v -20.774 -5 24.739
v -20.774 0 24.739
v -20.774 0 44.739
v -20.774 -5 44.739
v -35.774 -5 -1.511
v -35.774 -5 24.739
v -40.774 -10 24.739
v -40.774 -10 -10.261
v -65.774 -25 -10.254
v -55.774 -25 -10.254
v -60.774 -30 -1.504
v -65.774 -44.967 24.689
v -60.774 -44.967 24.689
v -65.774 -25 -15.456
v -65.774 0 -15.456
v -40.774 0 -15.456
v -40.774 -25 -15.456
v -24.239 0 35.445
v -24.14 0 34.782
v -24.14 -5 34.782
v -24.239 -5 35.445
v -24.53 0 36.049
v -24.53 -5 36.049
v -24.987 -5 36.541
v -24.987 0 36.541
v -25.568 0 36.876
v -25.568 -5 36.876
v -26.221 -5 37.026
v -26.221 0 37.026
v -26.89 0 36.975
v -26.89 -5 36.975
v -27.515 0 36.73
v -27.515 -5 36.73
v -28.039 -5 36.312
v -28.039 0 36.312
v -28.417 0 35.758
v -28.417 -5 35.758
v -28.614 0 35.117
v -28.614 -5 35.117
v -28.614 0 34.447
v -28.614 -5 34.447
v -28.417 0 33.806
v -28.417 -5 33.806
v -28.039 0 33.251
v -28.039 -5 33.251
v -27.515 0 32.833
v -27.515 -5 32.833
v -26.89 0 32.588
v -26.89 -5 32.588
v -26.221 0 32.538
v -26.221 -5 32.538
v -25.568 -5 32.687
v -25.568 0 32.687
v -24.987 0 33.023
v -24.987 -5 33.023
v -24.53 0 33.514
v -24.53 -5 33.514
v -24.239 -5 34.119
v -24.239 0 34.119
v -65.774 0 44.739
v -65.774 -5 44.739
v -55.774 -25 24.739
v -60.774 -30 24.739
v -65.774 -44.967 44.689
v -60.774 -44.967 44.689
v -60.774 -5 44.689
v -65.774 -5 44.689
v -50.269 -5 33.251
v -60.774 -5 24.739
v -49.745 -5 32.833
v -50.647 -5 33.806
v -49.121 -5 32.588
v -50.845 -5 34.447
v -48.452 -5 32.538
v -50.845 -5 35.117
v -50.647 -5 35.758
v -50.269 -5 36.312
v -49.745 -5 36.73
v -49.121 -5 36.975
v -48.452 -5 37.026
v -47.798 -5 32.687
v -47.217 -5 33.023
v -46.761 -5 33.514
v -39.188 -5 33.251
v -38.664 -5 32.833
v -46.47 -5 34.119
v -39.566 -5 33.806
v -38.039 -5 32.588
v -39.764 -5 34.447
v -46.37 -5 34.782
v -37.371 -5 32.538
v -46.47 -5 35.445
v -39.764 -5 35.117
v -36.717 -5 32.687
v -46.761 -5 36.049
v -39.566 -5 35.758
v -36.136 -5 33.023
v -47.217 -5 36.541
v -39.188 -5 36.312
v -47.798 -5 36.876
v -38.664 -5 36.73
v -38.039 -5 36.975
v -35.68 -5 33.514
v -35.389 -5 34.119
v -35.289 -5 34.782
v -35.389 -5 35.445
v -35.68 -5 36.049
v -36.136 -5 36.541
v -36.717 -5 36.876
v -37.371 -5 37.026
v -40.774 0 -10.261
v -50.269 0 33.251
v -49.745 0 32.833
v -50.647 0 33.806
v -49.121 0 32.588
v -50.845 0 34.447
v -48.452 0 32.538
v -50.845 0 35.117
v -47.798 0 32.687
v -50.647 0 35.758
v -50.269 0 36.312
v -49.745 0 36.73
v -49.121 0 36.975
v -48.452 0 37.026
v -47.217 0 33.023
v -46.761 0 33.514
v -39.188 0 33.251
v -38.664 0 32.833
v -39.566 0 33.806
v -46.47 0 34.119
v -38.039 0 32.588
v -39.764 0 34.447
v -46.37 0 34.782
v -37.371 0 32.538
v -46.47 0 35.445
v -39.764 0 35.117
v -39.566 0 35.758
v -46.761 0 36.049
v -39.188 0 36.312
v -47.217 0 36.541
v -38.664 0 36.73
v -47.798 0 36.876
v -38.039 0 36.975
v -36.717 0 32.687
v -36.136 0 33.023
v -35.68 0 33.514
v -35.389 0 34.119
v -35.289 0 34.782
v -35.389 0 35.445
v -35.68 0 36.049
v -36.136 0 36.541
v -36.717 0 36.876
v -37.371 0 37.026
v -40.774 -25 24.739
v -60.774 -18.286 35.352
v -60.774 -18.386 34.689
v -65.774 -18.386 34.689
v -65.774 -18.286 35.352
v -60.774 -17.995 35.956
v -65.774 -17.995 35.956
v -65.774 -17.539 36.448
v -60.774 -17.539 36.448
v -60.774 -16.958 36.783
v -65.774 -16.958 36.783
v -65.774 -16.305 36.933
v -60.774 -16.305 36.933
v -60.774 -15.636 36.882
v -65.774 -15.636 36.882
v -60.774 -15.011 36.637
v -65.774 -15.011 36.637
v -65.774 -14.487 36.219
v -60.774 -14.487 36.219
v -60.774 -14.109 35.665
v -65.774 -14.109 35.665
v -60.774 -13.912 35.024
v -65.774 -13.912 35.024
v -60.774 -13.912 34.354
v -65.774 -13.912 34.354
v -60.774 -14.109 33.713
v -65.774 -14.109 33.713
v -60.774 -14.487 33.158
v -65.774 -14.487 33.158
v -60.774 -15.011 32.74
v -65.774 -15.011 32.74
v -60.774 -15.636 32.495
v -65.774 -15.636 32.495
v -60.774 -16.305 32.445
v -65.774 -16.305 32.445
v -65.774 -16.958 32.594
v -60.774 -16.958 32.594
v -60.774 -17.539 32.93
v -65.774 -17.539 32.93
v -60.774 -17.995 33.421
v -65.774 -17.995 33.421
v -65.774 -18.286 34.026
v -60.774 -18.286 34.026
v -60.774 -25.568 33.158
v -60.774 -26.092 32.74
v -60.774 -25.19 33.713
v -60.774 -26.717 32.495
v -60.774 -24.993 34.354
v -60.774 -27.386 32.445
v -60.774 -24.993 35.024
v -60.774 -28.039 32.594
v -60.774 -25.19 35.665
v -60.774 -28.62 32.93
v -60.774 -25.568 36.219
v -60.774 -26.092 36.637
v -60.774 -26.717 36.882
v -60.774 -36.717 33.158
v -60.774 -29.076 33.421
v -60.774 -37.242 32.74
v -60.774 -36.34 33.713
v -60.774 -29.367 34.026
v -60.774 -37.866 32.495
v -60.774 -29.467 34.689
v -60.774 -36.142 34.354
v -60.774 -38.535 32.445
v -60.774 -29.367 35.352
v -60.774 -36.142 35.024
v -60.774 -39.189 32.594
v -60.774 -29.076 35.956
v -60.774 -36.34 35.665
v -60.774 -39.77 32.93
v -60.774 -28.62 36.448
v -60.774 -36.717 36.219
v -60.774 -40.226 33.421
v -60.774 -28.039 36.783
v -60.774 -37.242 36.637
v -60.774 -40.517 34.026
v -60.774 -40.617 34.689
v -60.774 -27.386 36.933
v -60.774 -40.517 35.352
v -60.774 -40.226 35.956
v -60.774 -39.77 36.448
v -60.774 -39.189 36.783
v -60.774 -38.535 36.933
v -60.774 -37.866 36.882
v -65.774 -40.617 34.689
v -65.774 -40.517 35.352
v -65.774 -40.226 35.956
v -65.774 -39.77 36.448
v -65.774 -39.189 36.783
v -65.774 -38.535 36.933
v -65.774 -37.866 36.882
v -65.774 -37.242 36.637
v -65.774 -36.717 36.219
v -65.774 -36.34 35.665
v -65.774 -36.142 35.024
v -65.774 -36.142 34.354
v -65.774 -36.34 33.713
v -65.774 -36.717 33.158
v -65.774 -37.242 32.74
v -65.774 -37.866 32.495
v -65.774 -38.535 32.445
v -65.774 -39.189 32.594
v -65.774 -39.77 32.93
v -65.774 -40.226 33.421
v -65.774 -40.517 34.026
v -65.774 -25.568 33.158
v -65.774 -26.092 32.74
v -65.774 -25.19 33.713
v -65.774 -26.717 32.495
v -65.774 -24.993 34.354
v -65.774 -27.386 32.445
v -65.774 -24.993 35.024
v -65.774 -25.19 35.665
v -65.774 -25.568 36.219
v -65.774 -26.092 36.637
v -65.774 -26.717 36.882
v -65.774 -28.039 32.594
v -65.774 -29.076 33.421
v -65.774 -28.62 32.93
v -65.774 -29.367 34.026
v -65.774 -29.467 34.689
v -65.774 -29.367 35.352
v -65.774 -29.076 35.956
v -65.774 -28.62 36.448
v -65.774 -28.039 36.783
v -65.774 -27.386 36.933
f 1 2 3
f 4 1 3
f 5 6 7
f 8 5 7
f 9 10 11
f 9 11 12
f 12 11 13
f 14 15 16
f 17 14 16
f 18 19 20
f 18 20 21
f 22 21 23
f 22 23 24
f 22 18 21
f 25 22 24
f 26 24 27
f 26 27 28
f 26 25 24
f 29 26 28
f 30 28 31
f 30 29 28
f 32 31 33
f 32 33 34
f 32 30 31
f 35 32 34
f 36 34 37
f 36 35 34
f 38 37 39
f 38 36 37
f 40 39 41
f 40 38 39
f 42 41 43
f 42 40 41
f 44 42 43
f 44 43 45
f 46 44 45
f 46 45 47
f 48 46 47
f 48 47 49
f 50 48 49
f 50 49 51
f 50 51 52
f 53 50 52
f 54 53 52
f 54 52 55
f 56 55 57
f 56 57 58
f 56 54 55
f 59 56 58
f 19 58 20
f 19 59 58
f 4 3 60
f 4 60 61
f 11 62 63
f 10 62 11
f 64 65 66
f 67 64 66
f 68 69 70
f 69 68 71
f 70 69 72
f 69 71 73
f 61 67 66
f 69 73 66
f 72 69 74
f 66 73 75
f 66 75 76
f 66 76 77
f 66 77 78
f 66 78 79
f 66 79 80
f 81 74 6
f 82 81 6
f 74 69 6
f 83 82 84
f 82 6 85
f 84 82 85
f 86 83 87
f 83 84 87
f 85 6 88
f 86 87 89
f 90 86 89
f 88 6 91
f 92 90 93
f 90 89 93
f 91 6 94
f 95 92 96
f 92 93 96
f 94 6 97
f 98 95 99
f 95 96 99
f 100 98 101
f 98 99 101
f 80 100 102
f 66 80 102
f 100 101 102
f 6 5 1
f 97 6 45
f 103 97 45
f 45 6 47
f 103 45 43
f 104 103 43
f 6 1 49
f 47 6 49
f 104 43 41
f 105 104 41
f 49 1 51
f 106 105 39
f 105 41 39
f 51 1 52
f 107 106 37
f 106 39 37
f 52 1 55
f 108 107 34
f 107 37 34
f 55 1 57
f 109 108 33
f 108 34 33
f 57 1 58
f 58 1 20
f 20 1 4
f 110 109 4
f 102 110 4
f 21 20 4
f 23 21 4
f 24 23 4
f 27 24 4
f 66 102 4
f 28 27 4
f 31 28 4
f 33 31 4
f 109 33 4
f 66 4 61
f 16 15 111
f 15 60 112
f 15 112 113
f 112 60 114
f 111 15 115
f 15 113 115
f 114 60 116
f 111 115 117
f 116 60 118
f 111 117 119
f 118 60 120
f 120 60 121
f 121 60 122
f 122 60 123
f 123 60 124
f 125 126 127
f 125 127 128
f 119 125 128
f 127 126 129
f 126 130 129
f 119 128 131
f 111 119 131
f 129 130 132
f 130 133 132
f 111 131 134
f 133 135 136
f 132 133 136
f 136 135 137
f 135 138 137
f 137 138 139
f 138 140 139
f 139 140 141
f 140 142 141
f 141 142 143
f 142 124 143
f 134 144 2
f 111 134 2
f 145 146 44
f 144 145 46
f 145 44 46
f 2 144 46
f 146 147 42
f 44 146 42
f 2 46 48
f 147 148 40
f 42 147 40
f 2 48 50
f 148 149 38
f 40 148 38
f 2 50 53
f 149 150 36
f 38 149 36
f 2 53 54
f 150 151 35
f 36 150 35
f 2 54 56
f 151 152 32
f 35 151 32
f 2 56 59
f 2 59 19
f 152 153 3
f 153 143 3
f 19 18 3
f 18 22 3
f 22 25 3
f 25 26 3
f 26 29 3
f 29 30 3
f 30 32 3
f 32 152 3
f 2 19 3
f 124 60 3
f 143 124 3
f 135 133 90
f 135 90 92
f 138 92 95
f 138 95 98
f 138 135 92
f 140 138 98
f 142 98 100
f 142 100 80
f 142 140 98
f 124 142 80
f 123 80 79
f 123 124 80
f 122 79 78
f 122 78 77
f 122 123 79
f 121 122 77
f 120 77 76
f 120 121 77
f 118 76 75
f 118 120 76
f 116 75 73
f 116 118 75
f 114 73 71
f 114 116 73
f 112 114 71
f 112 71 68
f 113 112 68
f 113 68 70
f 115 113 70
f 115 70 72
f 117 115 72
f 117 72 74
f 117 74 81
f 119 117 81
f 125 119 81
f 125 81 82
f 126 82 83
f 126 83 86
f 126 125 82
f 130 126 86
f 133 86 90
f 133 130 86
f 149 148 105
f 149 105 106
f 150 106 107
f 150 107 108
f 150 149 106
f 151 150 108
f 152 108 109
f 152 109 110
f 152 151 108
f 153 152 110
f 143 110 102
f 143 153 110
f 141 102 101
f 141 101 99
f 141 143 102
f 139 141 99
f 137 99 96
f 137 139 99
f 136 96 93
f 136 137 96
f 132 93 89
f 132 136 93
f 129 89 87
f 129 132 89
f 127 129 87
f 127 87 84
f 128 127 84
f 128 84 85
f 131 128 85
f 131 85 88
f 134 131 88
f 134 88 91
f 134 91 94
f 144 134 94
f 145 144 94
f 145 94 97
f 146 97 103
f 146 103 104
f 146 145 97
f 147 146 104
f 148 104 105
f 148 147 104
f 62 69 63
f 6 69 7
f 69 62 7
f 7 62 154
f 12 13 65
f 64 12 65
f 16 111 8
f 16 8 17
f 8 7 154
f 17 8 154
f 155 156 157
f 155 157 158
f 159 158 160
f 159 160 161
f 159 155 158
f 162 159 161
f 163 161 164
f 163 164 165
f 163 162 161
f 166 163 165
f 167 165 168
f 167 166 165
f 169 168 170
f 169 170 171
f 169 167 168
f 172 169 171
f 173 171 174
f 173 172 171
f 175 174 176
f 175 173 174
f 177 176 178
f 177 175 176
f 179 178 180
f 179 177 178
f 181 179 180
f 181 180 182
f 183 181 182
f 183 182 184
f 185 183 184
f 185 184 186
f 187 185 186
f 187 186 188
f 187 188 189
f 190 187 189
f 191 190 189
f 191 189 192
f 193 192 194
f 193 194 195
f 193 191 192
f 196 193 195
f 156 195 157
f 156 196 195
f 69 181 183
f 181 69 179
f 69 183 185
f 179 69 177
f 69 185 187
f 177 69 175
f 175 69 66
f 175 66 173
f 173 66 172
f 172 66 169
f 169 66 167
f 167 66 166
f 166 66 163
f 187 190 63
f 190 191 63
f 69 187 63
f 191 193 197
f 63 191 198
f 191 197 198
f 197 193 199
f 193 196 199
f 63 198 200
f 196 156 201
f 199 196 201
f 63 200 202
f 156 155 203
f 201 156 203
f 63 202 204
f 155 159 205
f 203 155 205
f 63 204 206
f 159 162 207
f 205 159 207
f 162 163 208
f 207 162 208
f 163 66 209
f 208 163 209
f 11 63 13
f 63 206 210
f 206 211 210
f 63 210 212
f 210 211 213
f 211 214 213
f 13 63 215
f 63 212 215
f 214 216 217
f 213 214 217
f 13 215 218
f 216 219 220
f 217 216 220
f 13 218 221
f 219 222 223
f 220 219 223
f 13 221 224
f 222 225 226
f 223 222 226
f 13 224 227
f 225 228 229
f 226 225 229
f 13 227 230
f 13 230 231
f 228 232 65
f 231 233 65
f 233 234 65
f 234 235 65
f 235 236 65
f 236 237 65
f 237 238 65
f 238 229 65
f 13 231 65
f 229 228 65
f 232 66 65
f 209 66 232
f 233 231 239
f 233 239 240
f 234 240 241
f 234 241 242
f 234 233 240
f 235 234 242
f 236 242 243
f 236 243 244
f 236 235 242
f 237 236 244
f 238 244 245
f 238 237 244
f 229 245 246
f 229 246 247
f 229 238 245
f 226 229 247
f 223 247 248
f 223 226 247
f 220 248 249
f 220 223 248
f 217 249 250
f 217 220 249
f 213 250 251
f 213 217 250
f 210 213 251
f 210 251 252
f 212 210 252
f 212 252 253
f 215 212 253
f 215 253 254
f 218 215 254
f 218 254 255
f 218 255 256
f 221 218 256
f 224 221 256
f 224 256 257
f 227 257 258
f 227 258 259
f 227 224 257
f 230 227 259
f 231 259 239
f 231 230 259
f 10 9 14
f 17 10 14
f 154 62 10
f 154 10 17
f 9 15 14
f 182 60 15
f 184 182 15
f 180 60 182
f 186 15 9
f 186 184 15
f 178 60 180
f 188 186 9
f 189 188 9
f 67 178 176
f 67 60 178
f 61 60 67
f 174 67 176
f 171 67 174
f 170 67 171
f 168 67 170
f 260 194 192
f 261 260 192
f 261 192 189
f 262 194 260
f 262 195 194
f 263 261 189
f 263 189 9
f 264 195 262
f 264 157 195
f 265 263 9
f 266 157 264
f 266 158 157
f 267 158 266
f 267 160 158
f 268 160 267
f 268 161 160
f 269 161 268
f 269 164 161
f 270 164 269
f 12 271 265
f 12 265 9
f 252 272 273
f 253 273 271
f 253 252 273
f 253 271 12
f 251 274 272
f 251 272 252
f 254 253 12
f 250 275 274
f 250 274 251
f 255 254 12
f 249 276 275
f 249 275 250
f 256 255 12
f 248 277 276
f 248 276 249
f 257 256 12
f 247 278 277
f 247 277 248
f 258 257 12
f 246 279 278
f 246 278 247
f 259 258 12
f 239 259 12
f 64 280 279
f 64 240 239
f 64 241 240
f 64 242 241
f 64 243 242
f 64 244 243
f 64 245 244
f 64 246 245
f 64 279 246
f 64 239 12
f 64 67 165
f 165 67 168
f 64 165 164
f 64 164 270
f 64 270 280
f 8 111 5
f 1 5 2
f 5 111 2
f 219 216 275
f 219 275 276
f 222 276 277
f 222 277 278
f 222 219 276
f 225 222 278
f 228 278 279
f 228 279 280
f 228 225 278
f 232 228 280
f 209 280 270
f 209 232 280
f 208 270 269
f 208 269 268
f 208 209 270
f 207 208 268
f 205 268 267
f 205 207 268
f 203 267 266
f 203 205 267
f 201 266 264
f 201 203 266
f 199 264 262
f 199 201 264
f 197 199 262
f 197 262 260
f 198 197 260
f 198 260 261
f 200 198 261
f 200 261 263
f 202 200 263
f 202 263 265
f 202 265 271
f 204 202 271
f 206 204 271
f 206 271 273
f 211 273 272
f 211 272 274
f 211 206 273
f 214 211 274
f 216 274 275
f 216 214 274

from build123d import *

# Parameters (mm, degrees)
F0_R          = 2.25
F1_DEPTH      = 5
F2_R          = 2.25
F3_DEPTH      = 5
F4_W          = 5
F4_H          = 55
F5_DEPTH      = 5
F6_W          = 25
F6_H          = 25
F7_DEPTH      = 5.195
F7_DEPTH_BACK = 35
F8_SIZE       = 5


with BuildPart() as f1:
    # F0 (on Front) → F1 (new body)
    with BuildSketch(Plane.XZ):
        Polygon((-20.774203624, 44.7394914553), (-60.774203624, 44.7394914553), (-60.774203624, 24.7394914553), (-60.774203624, -10.2605085447), (-40.774203624, -10.2605085447), (-20.774203624, 24.7394914553), align=None)
        with Locations((-48.619884952, 34.7818620503)):
            Circle(F0_R, mode=Mode.SUBTRACT)
        with Locations((-37.538797351, 34.7818620503)):
            Circle(F0_R, mode=Mode.SUBTRACT)
        with Locations((-26.3895275705, 34.7818620503)):
            Circle(F0_R, mode=Mode.SUBTRACT)
    extrude(amount=F1_DEPTH)



with BuildPart() as f3:
    # F2 (on face) → F3 (new body)
    with BuildSketch(Plane(origin=(-60.774203624, 0, 0), x_dir=(0, -1, 0), z_dir=(-1, 0, 0))):
        Polygon((44.9674582002, 44.6888683979), (5, 44.6888683979), (5, -10.2605085447), (4.9674582002, -10.2605085447), (4.9674582002, -10.3111316021), (24.9674582002, -10.3111316021), (44.9674582002, 24.6888683979), align=None)
        with Locations((16.1363705993, 34.6888683979)):
            Circle(F2_R, mode=Mode.SUBTRACT)
        with Locations((27.2174582002, 34.6888683979)):
            Circle(F2_R, mode=Mode.SUBTRACT)
        with Locations((38.3667279808, 34.6888683979)):
            Circle(F2_R, mode=Mode.SUBTRACT)
    extrude(amount=F3_DEPTH)


with BuildPart() as f1_1:
    add(f1.part)

    add(f3.part)  # F5 merges F3
    # F4 (on face) → F5 (join)
    with BuildSketch(Plane(origin=(-60.774203624, 0, 0), x_dir=(0, -1, 0), z_dir=(-1, 0, 0))):
        with Locations((2.5, 17.2394914553)):
            Rectangle(F4_W, F4_H)
    extrude(amount=F5_DEPTH)

    # F6 (on face) → F7 (join, two sides)
    with BuildSketch(Plane(origin=(0, 0, -10.2605085447), x_dir=(1, 0, 0), z_dir=(0, 0, -1))) as f7_sk:
        with Locations((-53.274203624, 12.5)):
            Rectangle(F6_W, F6_H)
    extrude(amount=F7_DEPTH)
    extrude(f7_sk.sketch, amount=-F7_DEPTH_BACK)

    # F8
    f8_edges = [f1_1.edges().sort_by_distance(p)[0] for p in [
        (-60.774204, -25, 7.242654),
        (-40.774204, -5, 7.239491),
    ]]
    chamfer(f8_edges, length=F8_SIZE)


solid = f1_1.part
